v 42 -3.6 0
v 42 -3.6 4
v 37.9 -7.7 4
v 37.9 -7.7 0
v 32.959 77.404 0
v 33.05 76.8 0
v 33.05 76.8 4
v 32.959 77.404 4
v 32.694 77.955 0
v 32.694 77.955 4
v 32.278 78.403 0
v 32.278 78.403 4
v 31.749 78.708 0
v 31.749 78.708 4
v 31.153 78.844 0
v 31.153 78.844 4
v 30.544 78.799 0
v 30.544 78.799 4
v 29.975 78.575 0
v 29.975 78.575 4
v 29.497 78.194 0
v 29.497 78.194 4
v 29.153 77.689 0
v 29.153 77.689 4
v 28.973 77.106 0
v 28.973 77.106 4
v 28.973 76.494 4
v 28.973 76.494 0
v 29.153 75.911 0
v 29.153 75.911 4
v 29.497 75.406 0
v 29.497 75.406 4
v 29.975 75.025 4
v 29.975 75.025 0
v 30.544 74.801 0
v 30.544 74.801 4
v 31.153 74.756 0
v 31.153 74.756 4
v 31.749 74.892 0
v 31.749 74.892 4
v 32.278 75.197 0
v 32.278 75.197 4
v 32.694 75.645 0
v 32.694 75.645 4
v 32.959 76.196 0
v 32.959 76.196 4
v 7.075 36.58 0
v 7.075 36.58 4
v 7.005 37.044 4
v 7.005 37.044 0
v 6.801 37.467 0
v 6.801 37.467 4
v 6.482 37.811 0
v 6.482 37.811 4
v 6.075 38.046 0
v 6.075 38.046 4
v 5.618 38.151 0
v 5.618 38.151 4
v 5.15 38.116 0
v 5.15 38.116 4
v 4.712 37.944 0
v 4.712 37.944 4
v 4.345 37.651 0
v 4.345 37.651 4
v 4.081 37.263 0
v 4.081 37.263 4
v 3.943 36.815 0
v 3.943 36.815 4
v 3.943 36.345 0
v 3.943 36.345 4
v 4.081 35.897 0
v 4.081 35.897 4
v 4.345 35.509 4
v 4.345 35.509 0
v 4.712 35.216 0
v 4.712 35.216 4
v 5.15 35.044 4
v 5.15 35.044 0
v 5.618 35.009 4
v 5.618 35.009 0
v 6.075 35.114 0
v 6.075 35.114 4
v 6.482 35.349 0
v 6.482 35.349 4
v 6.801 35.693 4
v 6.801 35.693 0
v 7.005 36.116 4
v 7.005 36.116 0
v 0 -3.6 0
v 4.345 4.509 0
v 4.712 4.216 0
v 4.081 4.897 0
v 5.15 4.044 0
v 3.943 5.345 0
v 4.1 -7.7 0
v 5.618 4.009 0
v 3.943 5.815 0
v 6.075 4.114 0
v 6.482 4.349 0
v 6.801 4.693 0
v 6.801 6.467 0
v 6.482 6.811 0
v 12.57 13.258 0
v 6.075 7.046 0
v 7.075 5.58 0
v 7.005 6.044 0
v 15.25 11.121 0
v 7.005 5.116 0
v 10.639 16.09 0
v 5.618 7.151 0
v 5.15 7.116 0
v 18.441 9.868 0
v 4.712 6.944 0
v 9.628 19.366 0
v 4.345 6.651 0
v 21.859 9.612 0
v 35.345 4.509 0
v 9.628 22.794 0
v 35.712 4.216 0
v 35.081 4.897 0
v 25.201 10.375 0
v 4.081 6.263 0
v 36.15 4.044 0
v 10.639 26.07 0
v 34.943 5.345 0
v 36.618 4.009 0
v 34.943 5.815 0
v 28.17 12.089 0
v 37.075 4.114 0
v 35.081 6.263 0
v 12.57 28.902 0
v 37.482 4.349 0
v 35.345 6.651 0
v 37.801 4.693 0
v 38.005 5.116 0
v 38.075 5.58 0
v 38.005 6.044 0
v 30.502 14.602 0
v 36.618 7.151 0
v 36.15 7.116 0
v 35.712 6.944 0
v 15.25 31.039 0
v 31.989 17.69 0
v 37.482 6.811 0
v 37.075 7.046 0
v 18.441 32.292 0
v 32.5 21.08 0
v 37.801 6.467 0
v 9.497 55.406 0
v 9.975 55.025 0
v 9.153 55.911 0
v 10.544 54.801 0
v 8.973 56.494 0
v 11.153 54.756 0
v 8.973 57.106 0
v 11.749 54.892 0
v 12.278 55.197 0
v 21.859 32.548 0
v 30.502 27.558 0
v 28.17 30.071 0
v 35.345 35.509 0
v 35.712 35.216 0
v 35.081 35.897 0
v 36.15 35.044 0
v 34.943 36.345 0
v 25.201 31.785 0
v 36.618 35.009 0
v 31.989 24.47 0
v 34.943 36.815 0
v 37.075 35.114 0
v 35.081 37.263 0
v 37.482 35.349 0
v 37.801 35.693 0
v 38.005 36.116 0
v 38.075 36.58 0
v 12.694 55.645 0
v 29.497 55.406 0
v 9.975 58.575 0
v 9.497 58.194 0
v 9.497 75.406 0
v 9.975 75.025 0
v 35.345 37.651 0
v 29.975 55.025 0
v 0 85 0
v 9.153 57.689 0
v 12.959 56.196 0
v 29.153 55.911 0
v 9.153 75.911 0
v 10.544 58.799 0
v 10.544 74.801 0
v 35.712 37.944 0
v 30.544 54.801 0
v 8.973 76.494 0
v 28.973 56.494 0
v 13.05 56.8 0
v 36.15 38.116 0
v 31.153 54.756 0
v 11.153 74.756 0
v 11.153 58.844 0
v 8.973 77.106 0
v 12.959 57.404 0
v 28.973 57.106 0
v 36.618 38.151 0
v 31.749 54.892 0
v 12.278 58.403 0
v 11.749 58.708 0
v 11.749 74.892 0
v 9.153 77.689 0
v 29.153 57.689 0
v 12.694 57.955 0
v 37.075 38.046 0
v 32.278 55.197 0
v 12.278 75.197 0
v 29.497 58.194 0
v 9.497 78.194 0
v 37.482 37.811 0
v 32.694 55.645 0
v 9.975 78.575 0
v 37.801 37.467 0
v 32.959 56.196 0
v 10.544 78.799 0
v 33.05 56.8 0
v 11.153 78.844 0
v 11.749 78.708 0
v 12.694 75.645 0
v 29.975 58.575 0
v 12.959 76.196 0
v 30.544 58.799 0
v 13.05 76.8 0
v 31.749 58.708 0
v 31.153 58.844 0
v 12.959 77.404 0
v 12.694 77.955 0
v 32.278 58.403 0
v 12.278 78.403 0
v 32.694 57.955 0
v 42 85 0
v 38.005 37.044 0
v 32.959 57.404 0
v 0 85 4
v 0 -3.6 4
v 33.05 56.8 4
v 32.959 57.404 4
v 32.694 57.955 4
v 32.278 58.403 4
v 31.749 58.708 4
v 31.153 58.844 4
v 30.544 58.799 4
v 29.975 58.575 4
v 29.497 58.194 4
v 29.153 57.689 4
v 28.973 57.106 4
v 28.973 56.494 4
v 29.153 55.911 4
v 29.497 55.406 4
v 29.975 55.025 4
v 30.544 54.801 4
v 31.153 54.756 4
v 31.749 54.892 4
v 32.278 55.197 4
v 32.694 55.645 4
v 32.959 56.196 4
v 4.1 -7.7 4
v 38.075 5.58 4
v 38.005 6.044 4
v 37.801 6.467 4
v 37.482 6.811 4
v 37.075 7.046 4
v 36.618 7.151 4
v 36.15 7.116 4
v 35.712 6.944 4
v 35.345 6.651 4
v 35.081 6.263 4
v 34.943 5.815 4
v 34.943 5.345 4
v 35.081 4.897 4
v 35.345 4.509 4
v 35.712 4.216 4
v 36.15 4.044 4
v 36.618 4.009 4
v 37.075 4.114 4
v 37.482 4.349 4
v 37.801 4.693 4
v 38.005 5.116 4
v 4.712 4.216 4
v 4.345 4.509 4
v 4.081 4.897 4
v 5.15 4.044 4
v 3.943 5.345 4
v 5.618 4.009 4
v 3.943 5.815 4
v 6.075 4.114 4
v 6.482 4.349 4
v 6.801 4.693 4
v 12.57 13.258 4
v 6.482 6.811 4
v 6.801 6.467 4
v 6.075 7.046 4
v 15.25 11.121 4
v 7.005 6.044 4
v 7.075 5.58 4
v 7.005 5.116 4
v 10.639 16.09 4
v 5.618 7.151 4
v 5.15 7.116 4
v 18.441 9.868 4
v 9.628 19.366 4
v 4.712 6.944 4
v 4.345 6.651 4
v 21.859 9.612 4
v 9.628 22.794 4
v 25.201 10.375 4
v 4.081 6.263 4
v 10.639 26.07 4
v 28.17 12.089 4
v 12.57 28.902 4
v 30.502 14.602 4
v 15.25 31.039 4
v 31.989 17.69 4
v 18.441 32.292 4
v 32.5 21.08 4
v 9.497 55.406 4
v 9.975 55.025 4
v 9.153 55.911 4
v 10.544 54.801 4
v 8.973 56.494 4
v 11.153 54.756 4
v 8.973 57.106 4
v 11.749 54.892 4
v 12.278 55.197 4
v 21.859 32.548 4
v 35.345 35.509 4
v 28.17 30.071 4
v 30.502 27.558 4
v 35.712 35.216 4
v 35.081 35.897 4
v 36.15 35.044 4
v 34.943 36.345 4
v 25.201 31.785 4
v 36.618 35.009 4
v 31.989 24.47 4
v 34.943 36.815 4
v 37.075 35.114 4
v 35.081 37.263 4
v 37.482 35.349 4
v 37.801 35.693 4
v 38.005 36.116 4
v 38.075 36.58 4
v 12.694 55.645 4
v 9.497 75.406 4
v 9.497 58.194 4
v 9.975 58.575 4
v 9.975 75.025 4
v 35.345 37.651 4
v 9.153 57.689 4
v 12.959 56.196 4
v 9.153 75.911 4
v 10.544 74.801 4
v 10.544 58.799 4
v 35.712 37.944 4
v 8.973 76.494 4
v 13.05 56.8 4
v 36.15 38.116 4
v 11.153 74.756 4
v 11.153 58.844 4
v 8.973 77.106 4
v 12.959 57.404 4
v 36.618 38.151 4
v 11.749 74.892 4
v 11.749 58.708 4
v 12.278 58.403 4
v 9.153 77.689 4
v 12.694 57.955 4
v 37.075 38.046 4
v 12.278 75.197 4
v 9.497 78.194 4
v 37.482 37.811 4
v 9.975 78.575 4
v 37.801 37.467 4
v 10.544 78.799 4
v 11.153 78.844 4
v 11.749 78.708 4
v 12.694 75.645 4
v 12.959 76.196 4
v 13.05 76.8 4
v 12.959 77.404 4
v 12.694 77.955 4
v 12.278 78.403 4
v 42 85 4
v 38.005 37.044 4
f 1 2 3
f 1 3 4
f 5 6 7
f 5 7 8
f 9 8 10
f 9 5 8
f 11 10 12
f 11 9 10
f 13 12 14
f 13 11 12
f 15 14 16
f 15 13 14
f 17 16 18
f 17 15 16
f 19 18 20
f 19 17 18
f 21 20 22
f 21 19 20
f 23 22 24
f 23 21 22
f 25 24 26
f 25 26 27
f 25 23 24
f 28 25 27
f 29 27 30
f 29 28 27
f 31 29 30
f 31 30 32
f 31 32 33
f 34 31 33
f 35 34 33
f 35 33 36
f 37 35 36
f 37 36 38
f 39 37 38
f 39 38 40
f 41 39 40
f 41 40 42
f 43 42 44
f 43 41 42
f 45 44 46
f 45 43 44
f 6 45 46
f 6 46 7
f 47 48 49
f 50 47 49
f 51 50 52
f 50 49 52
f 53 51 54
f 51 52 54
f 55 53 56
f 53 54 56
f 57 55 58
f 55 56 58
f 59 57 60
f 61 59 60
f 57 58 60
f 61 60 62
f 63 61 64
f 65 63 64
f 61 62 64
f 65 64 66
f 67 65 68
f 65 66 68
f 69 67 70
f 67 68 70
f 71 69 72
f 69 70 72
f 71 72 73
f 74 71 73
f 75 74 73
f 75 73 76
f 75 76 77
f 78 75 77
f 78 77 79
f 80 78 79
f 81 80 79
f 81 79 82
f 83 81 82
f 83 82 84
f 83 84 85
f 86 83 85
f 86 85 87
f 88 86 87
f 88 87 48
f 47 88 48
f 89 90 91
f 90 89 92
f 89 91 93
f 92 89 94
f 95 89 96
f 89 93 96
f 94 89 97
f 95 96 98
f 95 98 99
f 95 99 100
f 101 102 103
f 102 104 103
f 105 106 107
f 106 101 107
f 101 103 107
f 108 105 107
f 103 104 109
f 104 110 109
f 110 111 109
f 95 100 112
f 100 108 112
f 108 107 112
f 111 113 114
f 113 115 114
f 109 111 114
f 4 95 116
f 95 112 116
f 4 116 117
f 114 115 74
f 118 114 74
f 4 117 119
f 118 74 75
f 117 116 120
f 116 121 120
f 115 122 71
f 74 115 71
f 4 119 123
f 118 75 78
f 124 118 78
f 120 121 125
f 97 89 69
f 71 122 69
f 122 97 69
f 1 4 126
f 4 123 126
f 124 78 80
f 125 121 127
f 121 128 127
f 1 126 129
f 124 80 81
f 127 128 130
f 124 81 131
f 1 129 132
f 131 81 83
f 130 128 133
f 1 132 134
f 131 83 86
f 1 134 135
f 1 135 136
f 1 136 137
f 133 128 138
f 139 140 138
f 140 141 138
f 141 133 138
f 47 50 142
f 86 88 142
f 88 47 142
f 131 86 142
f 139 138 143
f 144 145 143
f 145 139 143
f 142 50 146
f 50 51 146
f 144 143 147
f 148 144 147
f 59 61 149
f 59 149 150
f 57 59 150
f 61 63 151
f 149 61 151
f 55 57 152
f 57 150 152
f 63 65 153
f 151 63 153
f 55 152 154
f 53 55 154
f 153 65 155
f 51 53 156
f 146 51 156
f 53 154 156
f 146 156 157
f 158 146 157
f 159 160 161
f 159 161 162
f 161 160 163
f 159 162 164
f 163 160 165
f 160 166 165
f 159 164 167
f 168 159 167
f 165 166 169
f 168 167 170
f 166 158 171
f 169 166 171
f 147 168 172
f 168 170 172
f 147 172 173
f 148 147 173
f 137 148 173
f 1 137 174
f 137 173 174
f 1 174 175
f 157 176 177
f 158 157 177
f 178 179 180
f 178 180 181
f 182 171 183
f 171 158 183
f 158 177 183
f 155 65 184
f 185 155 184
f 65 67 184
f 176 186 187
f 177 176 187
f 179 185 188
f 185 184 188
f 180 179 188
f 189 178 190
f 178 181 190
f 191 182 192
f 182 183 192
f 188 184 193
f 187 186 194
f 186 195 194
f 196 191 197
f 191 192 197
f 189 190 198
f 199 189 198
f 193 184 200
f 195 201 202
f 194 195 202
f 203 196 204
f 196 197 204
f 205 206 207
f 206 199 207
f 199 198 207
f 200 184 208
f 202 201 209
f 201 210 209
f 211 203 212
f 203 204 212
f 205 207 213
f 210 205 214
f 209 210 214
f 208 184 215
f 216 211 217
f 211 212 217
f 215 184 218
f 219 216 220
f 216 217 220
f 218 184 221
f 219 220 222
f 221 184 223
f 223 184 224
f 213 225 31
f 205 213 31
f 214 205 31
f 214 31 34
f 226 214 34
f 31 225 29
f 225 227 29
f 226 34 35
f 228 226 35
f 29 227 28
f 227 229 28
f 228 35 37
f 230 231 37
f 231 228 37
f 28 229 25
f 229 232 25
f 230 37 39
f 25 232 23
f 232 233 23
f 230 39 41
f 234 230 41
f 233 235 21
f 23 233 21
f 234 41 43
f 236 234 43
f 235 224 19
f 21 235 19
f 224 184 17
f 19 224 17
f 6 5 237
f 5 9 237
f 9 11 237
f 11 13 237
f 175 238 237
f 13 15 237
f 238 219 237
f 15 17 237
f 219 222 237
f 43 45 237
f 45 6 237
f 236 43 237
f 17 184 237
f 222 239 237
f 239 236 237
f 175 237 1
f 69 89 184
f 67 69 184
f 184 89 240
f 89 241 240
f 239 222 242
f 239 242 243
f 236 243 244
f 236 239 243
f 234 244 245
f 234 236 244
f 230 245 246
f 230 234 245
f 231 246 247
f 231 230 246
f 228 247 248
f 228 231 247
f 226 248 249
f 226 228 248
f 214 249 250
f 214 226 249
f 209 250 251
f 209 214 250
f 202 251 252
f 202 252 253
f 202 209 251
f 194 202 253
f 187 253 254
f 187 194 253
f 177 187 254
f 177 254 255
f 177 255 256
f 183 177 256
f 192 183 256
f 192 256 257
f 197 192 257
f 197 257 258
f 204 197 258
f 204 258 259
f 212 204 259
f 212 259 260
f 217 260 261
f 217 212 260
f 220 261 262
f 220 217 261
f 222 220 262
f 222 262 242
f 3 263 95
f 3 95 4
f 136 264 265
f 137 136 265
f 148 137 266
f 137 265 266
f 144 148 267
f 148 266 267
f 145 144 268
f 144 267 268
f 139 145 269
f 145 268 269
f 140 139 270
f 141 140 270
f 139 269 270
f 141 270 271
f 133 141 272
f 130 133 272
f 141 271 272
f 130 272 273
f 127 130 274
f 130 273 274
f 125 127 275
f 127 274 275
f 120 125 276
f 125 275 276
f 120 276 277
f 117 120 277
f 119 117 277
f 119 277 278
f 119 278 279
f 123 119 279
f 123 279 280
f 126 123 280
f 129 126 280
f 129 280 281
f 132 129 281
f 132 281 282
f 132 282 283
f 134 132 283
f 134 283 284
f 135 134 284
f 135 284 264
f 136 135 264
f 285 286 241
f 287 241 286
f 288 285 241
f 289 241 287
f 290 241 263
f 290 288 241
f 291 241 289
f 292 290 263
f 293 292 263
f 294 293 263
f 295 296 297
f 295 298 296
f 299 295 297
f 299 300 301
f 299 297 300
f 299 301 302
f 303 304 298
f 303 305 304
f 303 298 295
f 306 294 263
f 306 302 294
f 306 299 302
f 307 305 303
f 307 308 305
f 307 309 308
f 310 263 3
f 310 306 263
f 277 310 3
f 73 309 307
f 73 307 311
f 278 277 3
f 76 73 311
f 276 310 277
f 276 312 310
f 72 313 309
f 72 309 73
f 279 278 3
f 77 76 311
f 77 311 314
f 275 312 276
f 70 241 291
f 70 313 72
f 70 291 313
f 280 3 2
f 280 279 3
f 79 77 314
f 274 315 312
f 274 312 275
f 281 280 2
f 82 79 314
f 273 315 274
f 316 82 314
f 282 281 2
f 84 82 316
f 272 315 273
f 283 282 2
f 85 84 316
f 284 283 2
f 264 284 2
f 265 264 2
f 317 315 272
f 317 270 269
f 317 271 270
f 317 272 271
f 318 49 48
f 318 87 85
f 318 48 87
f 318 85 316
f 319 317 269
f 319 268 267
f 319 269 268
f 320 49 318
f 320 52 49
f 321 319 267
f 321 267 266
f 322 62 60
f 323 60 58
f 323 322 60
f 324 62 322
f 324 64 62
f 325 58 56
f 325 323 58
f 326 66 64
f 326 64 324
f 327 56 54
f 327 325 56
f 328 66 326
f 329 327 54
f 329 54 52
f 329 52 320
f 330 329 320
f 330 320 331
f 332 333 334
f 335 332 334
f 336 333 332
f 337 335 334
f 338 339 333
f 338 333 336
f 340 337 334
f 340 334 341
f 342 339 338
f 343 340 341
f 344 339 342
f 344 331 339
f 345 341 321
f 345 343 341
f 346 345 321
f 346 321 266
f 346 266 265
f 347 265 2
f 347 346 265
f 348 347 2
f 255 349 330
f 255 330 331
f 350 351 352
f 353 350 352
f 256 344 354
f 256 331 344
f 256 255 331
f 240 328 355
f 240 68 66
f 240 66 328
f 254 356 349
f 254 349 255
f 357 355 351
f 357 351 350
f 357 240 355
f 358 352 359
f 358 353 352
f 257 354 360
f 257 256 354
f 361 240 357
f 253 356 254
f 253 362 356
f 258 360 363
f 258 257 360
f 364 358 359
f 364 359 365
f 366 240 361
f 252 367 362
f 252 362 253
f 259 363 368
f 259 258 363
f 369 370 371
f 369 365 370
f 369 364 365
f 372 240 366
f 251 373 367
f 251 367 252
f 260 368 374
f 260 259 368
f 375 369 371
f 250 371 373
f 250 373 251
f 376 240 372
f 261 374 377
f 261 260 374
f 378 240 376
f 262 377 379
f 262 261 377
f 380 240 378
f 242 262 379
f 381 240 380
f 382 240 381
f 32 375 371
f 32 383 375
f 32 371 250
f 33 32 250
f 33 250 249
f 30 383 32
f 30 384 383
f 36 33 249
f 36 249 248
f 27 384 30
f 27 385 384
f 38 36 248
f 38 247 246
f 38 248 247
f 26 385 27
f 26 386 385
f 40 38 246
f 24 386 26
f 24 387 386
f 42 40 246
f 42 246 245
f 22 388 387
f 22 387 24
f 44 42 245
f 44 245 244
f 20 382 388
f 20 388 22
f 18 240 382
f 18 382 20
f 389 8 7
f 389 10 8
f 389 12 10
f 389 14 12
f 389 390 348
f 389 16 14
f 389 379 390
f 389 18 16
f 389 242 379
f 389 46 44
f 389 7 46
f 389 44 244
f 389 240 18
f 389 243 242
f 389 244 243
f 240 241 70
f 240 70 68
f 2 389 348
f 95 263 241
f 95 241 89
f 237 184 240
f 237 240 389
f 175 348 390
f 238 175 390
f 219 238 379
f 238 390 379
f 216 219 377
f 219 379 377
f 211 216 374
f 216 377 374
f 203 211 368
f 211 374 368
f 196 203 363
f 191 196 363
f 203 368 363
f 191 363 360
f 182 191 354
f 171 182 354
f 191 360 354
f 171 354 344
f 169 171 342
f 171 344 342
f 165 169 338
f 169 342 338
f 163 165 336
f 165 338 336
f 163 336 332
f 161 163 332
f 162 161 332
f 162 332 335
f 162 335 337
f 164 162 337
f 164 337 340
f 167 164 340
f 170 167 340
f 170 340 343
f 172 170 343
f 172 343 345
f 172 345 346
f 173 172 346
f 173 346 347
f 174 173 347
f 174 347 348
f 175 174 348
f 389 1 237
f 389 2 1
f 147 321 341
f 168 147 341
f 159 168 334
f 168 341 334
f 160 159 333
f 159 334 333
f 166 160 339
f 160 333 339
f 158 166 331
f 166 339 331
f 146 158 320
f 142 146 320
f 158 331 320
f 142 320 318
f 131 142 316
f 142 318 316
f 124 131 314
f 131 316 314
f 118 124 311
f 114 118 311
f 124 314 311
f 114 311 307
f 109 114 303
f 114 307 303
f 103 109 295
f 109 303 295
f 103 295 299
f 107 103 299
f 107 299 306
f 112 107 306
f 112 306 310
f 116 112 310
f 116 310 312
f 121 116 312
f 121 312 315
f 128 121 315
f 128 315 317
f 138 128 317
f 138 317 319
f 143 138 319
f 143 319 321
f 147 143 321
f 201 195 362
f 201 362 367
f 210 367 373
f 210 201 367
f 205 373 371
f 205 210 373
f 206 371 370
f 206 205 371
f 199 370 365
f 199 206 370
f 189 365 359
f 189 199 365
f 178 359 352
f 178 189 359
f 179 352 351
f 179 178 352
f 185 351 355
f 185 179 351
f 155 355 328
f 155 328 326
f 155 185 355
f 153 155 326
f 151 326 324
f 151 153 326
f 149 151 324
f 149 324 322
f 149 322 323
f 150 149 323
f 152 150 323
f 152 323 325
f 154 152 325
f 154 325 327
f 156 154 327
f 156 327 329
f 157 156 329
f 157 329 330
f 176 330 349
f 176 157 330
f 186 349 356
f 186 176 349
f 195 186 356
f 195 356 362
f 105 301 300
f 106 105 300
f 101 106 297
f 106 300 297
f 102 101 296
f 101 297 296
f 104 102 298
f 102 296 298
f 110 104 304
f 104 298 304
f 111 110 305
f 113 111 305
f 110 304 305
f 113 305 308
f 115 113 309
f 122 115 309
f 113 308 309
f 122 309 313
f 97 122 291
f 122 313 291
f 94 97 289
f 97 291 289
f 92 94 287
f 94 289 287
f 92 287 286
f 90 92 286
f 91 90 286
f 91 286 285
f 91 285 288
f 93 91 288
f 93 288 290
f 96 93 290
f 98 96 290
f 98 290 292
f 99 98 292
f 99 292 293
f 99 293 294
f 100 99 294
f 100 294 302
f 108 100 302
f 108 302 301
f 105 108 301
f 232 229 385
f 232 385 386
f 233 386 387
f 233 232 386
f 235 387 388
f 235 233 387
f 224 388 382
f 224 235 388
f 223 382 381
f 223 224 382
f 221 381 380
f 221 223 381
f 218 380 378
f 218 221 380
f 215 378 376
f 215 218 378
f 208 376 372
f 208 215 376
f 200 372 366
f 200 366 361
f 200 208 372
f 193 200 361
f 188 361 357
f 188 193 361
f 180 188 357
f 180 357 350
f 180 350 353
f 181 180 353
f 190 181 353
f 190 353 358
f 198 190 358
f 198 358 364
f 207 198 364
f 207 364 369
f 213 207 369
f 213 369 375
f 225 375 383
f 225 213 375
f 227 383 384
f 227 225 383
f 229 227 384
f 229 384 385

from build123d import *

# Parameters (mm, degrees)
CROQUIS1_W              = 42
CROQUIS1_H              = 85
CROQUIS1_R              = 2.05
CROQUIS1_R_2            = 2.55
SALIENTE_EXTRUIR1_DEPTH = 4
CROQUIS5_R              = 11.5
CROQUIS5_R_2            = 1.575
CORTAR_EXTRUIR2_DEPTH   = 5
CROQUIS7_W              = 42
CROQUIS7_H              = 7.7
SALIENTE_EXTRUIR2_DEPTH = 4
CHAFL_N1_SIZE           = 4.1


with BuildPart() as part:
    # Croquis1 → Saliente-Extruir1 (new body)
    with BuildSketch(Plane.XY):
        with Locations((21, 42.5)):
            Rectangle(CROQUIS1_W, CROQUIS1_H)
        with Locations((11, 76.8)):
            Circle(CROQUIS1_R, mode=Mode.SUBTRACT)
        with Locations((31, 76.8)):
            Circle(CROQUIS1_R, mode=Mode.SUBTRACT)
        with Locations((31, 56.8)):
            Circle(CROQUIS1_R, mode=Mode.SUBTRACT)
        with Locations((11, 56.8)):
            Circle(CROQUIS1_R, mode=Mode.SUBTRACT)
        with Locations((21, 21.08)):
            Circle(CROQUIS1_R_2, mode=Mode.SUBTRACT)
    extrude(amount=SALIENTE_EXTRUIR1_DEPTH)

    # Croquis5 → Cortar-Extruir2 (cut, through all)
    with BuildSketch(Plane.XY.offset(4)):
        with Locations((21, 21.08)):
            Circle(CROQUIS5_R)
        with Locations((5.5, 36.58)):
            Circle(CROQUIS5_R_2)
        with Locations((36.5, 36.58)):
            Circle(CROQUIS5_R_2)
        with Locations((36.5, 5.58)):
            Circle(CROQUIS5_R_2)
        with Locations((5.5, 5.58)):
            Circle(CROQUIS5_R_2)
    extrude(amount=-CORTAR_EXTRUIR2_DEPTH, mode=Mode.SUBTRACT)

    # Croquis7 → Saliente-Extruir2 (add, through all)
    with BuildSketch(Plane.XY.offset(4)):
        with Locations((21, -3.85)):
            Rectangle(CROQUIS7_W, CROQUIS7_H)
    extrude(amount=-SALIENTE_EXTRUIR2_DEPTH)

    # Chaflán1
    chafl_n1_edges = [part.edges().sort_by_distance(p)[0] for p in [
        (0, -7.7, 2),
        (42, -7.7, 2),
    ]]
    chamfer(chafl_n1_edges, length=CHAFL_N1_SIZE)


solid = part.part
